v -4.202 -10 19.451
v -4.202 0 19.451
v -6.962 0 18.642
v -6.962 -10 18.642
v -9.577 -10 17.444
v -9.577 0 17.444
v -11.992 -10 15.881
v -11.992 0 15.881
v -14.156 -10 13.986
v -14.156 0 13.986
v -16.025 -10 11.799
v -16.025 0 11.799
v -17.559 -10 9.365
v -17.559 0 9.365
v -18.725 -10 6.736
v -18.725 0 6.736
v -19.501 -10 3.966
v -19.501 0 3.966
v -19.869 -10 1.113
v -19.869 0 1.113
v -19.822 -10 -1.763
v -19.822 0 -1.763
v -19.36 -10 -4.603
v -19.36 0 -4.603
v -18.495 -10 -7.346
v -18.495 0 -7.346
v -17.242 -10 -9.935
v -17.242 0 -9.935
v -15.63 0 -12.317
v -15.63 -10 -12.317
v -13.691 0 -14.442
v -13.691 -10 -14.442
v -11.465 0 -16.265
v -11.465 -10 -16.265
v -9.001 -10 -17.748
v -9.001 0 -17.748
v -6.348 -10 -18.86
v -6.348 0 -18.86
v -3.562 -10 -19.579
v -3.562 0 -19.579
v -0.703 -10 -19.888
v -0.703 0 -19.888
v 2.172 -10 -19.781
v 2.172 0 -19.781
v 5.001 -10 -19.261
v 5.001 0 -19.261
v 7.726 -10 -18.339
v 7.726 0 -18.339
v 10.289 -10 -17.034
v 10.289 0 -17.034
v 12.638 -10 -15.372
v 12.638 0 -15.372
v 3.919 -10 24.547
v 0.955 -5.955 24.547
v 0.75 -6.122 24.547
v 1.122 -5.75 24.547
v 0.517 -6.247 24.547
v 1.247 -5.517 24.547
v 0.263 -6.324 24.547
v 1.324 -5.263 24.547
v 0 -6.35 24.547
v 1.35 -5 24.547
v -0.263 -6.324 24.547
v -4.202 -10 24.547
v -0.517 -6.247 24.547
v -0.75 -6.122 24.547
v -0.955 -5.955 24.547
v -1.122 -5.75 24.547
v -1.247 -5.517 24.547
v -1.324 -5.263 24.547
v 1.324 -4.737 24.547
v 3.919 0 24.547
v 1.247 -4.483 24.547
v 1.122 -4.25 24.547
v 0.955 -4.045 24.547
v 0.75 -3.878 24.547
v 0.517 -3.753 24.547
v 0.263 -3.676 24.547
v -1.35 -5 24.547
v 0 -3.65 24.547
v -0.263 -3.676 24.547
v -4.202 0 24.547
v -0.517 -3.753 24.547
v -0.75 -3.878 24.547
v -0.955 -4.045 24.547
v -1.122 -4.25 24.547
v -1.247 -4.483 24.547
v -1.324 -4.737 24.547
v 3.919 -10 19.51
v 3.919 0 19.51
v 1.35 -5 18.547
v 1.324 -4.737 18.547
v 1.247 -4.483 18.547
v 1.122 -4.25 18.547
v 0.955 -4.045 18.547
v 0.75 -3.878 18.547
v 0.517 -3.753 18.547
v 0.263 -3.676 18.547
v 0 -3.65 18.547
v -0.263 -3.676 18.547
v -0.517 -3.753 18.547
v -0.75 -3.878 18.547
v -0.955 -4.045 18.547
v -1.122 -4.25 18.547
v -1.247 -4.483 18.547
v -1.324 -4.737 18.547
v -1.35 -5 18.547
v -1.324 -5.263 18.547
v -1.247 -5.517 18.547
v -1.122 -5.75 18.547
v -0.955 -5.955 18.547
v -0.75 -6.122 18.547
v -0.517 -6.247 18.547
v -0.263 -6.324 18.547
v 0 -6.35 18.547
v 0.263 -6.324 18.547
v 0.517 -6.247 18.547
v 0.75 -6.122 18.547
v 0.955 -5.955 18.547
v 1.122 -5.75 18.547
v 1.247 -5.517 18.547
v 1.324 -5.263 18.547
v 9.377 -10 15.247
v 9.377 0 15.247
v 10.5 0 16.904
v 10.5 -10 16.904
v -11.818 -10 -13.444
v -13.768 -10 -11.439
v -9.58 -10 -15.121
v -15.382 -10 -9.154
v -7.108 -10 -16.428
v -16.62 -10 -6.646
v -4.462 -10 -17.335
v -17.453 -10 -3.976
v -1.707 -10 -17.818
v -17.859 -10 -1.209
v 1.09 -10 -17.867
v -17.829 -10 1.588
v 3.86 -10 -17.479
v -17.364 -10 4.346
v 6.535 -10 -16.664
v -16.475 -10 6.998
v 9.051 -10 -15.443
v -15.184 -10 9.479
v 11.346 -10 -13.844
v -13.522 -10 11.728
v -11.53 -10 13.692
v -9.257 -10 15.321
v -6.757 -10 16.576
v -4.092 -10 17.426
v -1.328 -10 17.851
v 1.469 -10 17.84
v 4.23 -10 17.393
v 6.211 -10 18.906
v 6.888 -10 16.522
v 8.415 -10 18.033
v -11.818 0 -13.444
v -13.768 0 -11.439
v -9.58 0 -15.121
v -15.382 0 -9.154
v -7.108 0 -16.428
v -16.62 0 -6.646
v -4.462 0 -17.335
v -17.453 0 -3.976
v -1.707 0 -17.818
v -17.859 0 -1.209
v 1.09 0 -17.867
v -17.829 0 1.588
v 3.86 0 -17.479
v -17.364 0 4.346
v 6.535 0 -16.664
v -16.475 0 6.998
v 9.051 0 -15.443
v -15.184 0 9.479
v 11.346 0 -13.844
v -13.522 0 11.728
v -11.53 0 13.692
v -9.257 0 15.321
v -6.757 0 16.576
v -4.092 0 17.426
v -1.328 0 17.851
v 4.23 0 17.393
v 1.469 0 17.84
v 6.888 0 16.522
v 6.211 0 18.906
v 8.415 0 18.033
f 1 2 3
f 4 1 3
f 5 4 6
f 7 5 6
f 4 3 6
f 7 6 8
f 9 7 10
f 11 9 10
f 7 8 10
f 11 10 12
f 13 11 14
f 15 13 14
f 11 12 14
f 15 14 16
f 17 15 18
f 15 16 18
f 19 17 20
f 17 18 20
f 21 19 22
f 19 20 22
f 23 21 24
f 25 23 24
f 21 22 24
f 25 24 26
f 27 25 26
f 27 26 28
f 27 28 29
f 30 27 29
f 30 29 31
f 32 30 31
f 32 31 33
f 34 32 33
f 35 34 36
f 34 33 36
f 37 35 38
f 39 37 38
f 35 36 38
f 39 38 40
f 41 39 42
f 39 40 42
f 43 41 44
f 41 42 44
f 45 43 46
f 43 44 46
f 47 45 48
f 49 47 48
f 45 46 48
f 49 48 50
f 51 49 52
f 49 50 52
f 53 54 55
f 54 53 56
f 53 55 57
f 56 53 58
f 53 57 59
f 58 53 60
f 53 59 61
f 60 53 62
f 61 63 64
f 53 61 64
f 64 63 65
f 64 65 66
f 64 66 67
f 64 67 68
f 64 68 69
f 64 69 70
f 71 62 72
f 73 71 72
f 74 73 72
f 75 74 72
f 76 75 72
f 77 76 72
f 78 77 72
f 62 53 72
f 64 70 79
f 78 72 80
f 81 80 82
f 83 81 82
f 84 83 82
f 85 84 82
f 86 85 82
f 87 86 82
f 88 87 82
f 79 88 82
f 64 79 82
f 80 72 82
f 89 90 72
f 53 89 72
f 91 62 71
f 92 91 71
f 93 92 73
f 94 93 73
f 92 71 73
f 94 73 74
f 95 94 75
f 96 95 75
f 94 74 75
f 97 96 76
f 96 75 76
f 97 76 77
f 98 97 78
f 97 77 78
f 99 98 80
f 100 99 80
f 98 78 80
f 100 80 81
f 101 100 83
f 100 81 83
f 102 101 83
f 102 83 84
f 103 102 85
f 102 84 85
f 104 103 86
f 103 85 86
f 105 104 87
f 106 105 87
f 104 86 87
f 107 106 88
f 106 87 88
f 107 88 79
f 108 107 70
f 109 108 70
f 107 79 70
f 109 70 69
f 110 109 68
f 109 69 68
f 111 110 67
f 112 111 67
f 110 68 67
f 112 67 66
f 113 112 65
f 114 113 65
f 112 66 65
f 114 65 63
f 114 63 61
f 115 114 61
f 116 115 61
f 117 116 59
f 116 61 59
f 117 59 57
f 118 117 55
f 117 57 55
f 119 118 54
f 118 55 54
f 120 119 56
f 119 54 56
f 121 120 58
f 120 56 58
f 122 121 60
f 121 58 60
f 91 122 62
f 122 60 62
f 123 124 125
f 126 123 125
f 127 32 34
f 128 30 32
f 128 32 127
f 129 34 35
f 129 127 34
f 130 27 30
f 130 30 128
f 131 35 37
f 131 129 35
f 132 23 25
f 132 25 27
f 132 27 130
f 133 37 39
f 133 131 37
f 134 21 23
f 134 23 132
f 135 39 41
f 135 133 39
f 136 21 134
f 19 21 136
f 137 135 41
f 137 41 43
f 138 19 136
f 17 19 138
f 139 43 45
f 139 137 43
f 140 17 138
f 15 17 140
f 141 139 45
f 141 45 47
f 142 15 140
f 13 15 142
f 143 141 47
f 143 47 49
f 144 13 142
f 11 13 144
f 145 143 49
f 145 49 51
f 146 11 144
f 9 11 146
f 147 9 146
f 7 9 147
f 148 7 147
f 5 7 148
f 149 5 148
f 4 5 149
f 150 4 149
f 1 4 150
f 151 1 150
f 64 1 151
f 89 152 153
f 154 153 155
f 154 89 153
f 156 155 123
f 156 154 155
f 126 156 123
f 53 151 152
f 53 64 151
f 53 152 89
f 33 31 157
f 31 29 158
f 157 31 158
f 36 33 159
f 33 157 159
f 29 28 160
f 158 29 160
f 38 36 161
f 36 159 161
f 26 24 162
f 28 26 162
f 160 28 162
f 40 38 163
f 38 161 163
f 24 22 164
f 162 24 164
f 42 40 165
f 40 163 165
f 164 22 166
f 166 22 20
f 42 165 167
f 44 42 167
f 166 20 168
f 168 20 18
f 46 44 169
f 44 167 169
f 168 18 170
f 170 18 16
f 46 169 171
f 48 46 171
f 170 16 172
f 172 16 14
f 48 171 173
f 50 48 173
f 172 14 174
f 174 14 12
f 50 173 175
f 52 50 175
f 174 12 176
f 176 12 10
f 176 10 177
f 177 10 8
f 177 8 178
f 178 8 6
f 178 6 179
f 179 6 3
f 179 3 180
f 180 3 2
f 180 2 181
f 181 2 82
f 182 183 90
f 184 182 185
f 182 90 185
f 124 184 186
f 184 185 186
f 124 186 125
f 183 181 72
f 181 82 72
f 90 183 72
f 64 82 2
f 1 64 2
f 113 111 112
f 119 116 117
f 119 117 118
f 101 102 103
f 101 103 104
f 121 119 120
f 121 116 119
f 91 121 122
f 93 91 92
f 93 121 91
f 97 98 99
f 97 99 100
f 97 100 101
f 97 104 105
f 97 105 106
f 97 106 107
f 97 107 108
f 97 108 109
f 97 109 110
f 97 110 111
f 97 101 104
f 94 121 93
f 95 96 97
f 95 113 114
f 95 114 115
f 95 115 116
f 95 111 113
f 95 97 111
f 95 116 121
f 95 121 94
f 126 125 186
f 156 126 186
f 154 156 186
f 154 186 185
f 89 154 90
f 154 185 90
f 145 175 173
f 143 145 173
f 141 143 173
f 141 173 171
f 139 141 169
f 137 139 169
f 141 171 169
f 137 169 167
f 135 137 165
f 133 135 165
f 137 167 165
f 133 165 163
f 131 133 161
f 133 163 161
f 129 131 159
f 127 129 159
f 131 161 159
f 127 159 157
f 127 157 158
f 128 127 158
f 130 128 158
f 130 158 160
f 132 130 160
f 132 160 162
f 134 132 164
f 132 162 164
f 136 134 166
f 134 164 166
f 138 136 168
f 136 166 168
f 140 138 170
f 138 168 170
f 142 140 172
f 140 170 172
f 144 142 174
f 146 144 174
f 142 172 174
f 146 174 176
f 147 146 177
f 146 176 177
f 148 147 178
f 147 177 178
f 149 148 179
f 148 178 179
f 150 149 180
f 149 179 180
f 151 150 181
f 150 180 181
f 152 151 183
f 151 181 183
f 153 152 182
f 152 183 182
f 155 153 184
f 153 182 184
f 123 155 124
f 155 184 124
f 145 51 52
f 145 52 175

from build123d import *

# Parameters (mm, degrees)
F1_DEPTH = 10
F2_R     = 1.35
F3_DEPTH = 6


with BuildPart() as f1:
    # F0 (on Front) → F1 (new body)
    with BuildSketch(Plane.XZ):
        with BuildLine():
            ThreePointArc((11.34649, -13.844391), (-17.859135, -1.208842), (9.377353, 15.247139))
            Line((9.377353, 15.247139), (10.500295, 16.904254))
            ThreePointArc((10.500295, 16.904254), (7.326353, 18.502285), (3.918794, 19.510332))
            Line((3.918794, 19.510332), (3.918794, 24.546802))
            Line((3.918794, 24.546802), (-4.201883, 24.546802))
            Line((-4.201883, 24.546802), (-4.201883, 19.451328))
            ThreePointArc((-4.201883, 19.451328), (-17.915323, -8.663209), (12.63751, -15.372161))
            Line((12.63751, -15.372161), (11.34649, -13.844391))
        make_face()
    extrude(amount=F1_DEPTH)

    # F2 (on face) → F3 (cut)
    with BuildSketch(Plane.XY.offset(24.546802)):
        with Locations((0, -5)):
            Circle(F2_R)
    extrude(amount=-F3_DEPTH, mode=Mode.SUBTRACT)


solid = f1.part
